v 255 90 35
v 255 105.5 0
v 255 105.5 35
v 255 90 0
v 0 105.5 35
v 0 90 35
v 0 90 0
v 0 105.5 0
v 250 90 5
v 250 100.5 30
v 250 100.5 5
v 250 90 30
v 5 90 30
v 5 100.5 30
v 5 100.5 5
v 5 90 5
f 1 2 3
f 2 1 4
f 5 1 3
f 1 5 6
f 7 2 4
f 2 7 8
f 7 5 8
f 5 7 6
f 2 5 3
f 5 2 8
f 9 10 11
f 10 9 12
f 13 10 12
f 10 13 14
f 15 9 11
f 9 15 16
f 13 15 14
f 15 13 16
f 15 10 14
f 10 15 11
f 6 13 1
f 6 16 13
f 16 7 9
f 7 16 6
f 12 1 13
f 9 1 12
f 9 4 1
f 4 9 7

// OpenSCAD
// file: parameters.scad
// ============================================================
// Global rendering
// ============================================================
// Facet quality (global). $fs holds constant surface smoothness across sizes;
// $fa caps facet count on large radii. OpenSCAD uses whichever yields more.
$fa = 1;
$fs = 0.4;

eps = 0.01;

// Fit clearance applied to mating parts.
tolerance = 0.3;

// ============================================================
// Case
// ============================================================

case_split_z = 20;
case_bottom_lip_width = 2;

// This is the depth that sticks out from the top of the bottom half of the case
case_bottom_lip_depth = 2;

case_screw_mount_diameter = 15;
case_screw_mount_width = 30;
case_screw_mount_height = 15;
case_screw_mount_spacing = 11;

// Planning on using M3x8 screws
case_screw_head_depth = 30;
case_screw_head_diameter = 5.35;
case_screw_thread_diameter = 3;
case_screw_thread_length = 8;
case_screw_spacing = 4;

// ============================================================
// Wedge (front-to-back taper)
// ============================================================
wedge_angle = 2;
wedge_slope = tan(wedge_angle);

// inverse the vector, divide by the norm (actual length) inversed vector.
// norm is NOT the normalization, it gets the actual length of the vector,
// and normalizing is dividing a vector by it's length.
wedge_normal = [0, -wedge_slope, 1] / norm([0, -wedge_slope, 1]);

// ============================================================
// Threaded inserts
// ============================================================
threaded_insert_diameter = 5;
threaded_insert_depth = 6;
threaded_insert_vertical_spacing = 2;
threaded_insert_post_diameter = threaded_insert_diameter + 5;

// ============================================================
// Walls
// ============================================================
wall_depth = 5;
top_and_bottom_wall_depth = 3.5;

// ============================================================
// Base dimensions (independent)
// Interior and exterior interconnect, so base values come first,
// then the derived values below.
// ============================================================
exterior_width = 255;
exterior_height = 211;
interior_depth = 28;

// ============================================================
// Derived dimensions
// ============================================================
// Interior <- exterior width/height
interior_width = exterior_width - (wall_depth * 2);
interior_height = exterior_height - (wall_depth * 2);
interior_front_depth = interior_depth;
interior_back_depth = (exterior_height * tan(wedge_angle)) + interior_front_depth;

// Exterior depth <- interior_depth
exterior_front_depth = interior_depth + (top_and_bottom_wall_depth * 2);
exterior_back_depth = (exterior_height * tan(wedge_angle)) + exterior_front_depth;

// ============================================================
// Keyboard
// ============================================================
keyboard_width = 230;
keyboard_height = 78;

keyboard_x = (exterior_width / 2) - (keyboard_width / 2) - wall_depth;
keyboard_y = 20;

// ============================================================
// Battery
// ============================================================
battery_pack_width = 87;
battery_pack_height = 63.65;

battery_x = interior_width - (battery_pack_width) - 23;
battery_y = interior_height - (battery_pack_height) - 17;

battery_pack_cover_width = battery_pack_width + 6;
battery_pack_cover_height = battery_pack_height + 6;

// ============================================================
// Screen
// ============================================================
screen_width = 84;
screen_height = 84;

// This is the depth of the screen + Pi
// Called it _to_mount because this is the amount of space from the top of the case to the mount posts
screen_depth_to_mount = 24.80;

// Centered in the bay bounded by the left corner screws and the mid-span pair. The USB hub
// keep-out (deck x 0 -> 38.7) notches this plinth's left edge, which is fine, but it also
// covers where the screen's low-x/low-y floor screw pocket would go. That one screw is
// omitted in screen_components.scad rather than shifting the screen off center — moving it
// would decenter the battery too, since the mid screws bound its bay as well.
screen_x = 25;
screen_y = interior_height - (screen_height) - 7;

screen_screw_thread_diameter = 2.5;
screen_screw_head_diameter = 4;
screen_screw_washer_diameter = 5;
screen_screw_thread_length = 8;

// This should include the washer depth as well
screen_screw_head_depth = 3.85;

// ============================================================
// Hub
// ============================================================

// Where the hub sits, in *exterior* deck coords — it does NOT go through
// interior_cutout_translate(), because the case sits square to the deck floor rather than
// following the wedge. Everything hub-related keys off this so the keep-out and the flange
// holes can't drift apart.
//
// x is -usb_deck_face_x (the collar's back face, half of usb_case_lip_depth), which lands the
// flange on the wall's outer surface at x = 0. Written as a literal because cyberdeck.scad
// pulls usb_components.scad in with `use`, so only its modules cross over, not its variables.
usb_hub_pos = [-2, 100, 6];

hub_board_height = 61.45;
hub_board_width = 25.40;
hub_usb_port_width = 13.25;
hub_usb_port_depth = 6;
hub_usb_port_length = 10;

hub_usb_port_mount_height = 7.5;
hub_usb_port_cutout_depth = 10;
// main file
include <parameters.scad>

/* [Cutaway] */

// Slice the model open to see the interior
show_cutaway = true;
// Axis the cut plane is perpendicular to
cutaway_axis = "y"; // [x, y, z]
// Where the cut plane sits along that axis
cutaway_at = 90; // [0:0.5:260]
// Keep the side with the larger coordinate rather than the smaller
cutaway_keep_above = true;

// A cut is described as a plane, not as a box: pick an axis, pick where along
// it to slice, pick which side to keep. `reach` is the size of the discarded
// solid and only has to overshoot the model, so nothing needs hand-tuning.
module cutaway(axis = cutaway_axis, at = cutaway_at, keep_above = cutaway_keep_above, enabled = show_cutaway, reach = 600) {
  // Fail loudly on a bad axis. Without this a typo is silent: "Y" falls
  // through the lookup below and cuts z, giving wrong geometry, not an error.
  assert(axis == "x" || axis == "y" || axis == "z", str("cutaway: bad axis '", axis, "'"));

  i = axis == "x" ? 0 : axis == "y" ? 1 : 2;

  // On the cut axis the discarded solid starts at the plane and runs away from
  // the side being kept; on the other two it is centered so it spans the model.
  origin = [for (k = [0:2]) k == i ? (keep_above ? at - reach : at) : -reach / 2];

  difference() {
    children();

    if (enabled)
      translate(origin) cube(reach);
  }
}

module case() {
  difference() {
    cube([exterior_width, exterior_height / 2, exterior_front_depth]);
    translate([wall_depth, wall_depth, wall_depth]) {
      cube([exterior_width - 2 * wall_depth, exterior_height / 2 - 2 * wall_depth, exterior_front_depth - 2 * wall_depth]);
    }
  }
}

cutaway() {
  case();
}
